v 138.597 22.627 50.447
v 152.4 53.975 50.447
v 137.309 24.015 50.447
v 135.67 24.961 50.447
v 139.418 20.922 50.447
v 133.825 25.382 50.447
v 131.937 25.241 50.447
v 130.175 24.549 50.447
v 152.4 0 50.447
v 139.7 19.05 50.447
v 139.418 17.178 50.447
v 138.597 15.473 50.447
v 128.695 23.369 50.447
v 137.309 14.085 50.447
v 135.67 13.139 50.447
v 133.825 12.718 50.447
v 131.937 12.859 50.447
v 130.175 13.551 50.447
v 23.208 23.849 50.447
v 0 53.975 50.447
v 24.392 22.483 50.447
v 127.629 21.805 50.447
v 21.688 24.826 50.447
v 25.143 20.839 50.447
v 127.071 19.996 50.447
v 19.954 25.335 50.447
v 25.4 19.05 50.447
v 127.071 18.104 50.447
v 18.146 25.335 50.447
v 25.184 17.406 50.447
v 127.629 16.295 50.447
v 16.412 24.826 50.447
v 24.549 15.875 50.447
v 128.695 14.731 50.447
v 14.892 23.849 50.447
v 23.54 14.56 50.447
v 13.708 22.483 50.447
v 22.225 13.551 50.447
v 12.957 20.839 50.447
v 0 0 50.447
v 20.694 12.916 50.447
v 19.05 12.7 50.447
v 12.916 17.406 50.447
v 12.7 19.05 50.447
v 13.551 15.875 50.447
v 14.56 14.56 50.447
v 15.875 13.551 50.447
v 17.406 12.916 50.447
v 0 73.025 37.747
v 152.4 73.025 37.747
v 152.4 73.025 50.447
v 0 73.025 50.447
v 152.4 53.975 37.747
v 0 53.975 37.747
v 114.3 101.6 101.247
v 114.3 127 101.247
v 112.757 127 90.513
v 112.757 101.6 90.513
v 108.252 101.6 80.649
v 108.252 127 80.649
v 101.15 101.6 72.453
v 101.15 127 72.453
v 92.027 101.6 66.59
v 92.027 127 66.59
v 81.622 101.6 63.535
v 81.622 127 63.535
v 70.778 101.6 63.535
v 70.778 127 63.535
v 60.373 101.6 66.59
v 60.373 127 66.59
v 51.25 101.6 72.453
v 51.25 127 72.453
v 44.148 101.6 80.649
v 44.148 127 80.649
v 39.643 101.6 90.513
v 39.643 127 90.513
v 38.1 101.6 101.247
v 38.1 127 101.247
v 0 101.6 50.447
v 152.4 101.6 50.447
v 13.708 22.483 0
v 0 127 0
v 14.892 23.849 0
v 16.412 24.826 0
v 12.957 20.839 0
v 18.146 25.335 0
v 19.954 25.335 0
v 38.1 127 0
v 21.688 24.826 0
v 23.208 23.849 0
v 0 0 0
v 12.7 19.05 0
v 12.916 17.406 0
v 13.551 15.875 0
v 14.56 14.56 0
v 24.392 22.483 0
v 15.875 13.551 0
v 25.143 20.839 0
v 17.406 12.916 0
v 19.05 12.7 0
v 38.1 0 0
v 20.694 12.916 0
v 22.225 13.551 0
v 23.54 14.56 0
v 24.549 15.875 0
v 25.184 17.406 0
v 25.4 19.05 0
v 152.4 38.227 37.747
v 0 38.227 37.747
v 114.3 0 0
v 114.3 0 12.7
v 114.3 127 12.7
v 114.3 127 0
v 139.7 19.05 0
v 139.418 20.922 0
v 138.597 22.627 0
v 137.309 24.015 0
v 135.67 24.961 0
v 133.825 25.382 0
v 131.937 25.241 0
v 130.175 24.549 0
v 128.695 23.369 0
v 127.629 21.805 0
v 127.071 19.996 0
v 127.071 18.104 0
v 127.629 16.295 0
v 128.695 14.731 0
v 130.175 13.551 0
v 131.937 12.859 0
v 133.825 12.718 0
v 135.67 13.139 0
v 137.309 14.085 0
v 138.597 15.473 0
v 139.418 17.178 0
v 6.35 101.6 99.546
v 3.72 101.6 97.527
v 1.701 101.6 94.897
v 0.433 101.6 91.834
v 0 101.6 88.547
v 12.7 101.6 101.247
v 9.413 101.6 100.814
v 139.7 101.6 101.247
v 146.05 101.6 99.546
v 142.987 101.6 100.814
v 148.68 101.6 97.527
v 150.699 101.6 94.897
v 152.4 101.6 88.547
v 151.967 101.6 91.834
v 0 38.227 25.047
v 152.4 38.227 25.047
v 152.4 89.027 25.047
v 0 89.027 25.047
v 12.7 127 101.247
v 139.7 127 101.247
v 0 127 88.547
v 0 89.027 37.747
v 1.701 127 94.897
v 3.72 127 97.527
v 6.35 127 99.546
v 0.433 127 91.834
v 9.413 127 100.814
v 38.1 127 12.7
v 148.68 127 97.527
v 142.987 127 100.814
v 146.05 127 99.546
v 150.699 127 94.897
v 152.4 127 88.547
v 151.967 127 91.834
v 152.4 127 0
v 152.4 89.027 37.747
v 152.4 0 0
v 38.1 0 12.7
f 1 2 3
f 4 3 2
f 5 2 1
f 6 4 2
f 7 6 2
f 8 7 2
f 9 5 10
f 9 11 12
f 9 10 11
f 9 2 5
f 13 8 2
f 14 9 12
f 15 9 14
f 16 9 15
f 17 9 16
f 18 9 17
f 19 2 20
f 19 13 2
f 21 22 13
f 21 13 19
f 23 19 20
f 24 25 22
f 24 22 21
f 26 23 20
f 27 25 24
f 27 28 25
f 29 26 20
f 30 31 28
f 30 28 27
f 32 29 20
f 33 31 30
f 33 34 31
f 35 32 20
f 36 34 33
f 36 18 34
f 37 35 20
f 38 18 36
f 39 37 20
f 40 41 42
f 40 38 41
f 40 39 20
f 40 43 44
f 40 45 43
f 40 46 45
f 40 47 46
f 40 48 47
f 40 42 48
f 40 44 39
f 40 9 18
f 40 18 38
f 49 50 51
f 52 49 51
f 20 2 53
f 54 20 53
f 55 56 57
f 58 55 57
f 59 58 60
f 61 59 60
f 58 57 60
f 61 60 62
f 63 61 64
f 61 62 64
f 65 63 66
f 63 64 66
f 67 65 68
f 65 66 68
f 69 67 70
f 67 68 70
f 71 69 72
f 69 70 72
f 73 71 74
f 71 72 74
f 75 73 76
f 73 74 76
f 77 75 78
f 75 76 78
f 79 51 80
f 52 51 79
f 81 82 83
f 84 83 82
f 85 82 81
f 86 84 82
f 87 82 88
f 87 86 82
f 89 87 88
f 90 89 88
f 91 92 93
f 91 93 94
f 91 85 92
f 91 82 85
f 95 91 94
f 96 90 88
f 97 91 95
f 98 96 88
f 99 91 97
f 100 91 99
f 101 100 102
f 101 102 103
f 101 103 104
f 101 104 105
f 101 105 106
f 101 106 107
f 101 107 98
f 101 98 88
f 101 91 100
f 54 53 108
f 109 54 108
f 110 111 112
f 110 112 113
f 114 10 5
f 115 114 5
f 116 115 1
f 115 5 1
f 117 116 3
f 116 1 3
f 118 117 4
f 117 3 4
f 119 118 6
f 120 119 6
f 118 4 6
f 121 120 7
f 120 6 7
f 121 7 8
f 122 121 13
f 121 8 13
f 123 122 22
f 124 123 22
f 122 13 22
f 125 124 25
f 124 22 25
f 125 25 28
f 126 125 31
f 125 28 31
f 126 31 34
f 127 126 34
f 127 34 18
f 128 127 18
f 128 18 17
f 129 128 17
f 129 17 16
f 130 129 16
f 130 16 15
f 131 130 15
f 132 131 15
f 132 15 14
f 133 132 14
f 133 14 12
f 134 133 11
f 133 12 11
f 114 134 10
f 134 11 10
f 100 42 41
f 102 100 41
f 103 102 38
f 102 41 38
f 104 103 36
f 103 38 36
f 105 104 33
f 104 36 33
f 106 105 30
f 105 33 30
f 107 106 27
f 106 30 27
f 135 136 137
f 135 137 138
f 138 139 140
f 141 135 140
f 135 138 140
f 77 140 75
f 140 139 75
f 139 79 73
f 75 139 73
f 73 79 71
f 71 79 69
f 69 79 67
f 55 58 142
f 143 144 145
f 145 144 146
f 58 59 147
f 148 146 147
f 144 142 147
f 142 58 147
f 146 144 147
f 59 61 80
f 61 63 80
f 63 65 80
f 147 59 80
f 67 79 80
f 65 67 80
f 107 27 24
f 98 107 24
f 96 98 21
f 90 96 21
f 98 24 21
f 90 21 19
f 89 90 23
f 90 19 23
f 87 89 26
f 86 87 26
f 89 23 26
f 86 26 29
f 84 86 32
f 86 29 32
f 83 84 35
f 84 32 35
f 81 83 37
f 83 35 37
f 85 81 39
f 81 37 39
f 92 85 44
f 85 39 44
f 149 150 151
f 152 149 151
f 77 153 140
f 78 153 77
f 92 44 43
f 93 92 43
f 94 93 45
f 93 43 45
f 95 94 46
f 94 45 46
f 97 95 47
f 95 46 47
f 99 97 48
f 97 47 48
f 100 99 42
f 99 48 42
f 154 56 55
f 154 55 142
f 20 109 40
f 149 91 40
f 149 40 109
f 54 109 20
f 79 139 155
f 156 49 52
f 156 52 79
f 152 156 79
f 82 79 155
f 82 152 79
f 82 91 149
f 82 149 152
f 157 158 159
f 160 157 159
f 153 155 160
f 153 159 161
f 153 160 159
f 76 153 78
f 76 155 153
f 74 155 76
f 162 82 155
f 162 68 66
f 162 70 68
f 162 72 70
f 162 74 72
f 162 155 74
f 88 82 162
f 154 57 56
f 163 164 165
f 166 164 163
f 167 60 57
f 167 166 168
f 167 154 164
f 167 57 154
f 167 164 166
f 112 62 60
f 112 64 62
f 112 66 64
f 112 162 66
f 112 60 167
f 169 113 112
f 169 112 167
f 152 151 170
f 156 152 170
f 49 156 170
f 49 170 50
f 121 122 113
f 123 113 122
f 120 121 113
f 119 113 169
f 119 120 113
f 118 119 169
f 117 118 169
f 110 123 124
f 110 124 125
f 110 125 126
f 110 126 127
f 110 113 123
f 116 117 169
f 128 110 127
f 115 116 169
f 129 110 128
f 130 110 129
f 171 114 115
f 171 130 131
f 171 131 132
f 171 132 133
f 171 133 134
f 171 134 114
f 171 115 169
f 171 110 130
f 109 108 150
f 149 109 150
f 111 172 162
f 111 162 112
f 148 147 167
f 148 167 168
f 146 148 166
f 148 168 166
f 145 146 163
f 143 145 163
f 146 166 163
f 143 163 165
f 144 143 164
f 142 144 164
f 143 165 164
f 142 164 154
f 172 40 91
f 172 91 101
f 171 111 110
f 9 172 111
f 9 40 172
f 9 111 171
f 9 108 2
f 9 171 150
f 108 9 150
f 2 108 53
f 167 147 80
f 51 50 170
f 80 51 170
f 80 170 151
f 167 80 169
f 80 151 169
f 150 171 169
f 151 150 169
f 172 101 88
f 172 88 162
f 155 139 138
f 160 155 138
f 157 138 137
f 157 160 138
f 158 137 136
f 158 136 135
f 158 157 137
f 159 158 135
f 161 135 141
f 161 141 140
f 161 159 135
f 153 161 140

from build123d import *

# Parameters (mm, degrees)
F1_DEPTH  = 127
F3_DEPTH  = 152.4
F4_W      = 152.4
F4_H      = 25.4
F5_DEPTH  = 50.8
F8_DEPTH  = 25.4
F9_R      = 12.7
F10_R     = 6.35
F11_DEPTH = 50.447222


with BuildPart() as f1:
    # F0 (on Front) → F1 (new body)
    with BuildSketch(Plane.XZ):
        Polygon((0, 50.447222), (0, 0), (38.1, 0), (38.1, 12.7), (114.3, 12.7), (114.3, 0), (152.4, 0), (152.4, 50.447222), align=None)
    extrude(amount=-F1_DEPTH)

    # F2 (on face) → F3 (cut, through all)
    with BuildSketch(Plane.YZ.offset(152.4)):
        Polygon((73.025, 50.447222), (53.975, 50.447222), (53.975, 37.747222), (38.227, 37.747222), (38.227, 25.047222), (89.027, 25.047222), (89.027, 37.747222), (73.025, 37.747222), align=None)
    extrude(amount=-F3_DEPTH, mode=Mode.SUBTRACT)

    # F4 (on face) → F5 (join)
    with BuildSketch(Plane.XY.offset(50.447222)):
        with Locations((76.2, 114.3)):
            Rectangle(F4_W, F4_H)
    extrude(amount=F5_DEPTH)

    # F7 (on face) → F8 (cut, through all)
    with BuildSketch(Plane(origin=(0, 127, 0), x_dir=(-1, 0, 0), z_dir=(0, 1, 0))):
        with BuildLine():
            Line((-76.2, 101.247222), (-114.3, 101.247222))
            ThreePointArc((-114.3, 101.247222), (-76.2, 63.147222), (-38.1, 101.247222))
            Line((-38.1, 101.247222), (-76.2, 101.247222))
        make_face()
    extrude(amount=-F8_DEPTH, mode=Mode.SUBTRACT)

    # F9
    f9_edges = [f1.edges().sort_by_distance(p)[0] for p in [
        (152.4, 114.3, 101.247222),
        (0, 114.3, 101.247222),
    ]]
    fillet(f9_edges, radius=F9_R)

    # F10 (on face) → F11 (cut, through all)
    with BuildSketch(Plane.XY.offset(50.447222)):
        with BuildLine():
            Line((19.05, 19.05), (19.05, 12.7))
            ThreePointArc((19.05, 12.7), (23.540128, 14.559872), (25.4, 19.05))
            ThreePointArc((25.4, 19.05), (19.05, 25.4), (12.7, 19.05))
            Line((12.7, 19.05), (19.05, 19.05))
        make_face()
        with BuildLine():
            ThreePointArc((12.7, 19.05), (14.559872, 14.559872), (19.05, 12.7))
            Line((19.05, 12.7), (19.05, 19.05))
            Line((19.05, 19.05), (12.7, 19.05))
        make_face()
        with Locations((133.35, 19.05)):
            Circle(F10_R)
    extrude(amount=-F11_DEPTH, mode=Mode.SUBTRACT)


solid = f1.part
